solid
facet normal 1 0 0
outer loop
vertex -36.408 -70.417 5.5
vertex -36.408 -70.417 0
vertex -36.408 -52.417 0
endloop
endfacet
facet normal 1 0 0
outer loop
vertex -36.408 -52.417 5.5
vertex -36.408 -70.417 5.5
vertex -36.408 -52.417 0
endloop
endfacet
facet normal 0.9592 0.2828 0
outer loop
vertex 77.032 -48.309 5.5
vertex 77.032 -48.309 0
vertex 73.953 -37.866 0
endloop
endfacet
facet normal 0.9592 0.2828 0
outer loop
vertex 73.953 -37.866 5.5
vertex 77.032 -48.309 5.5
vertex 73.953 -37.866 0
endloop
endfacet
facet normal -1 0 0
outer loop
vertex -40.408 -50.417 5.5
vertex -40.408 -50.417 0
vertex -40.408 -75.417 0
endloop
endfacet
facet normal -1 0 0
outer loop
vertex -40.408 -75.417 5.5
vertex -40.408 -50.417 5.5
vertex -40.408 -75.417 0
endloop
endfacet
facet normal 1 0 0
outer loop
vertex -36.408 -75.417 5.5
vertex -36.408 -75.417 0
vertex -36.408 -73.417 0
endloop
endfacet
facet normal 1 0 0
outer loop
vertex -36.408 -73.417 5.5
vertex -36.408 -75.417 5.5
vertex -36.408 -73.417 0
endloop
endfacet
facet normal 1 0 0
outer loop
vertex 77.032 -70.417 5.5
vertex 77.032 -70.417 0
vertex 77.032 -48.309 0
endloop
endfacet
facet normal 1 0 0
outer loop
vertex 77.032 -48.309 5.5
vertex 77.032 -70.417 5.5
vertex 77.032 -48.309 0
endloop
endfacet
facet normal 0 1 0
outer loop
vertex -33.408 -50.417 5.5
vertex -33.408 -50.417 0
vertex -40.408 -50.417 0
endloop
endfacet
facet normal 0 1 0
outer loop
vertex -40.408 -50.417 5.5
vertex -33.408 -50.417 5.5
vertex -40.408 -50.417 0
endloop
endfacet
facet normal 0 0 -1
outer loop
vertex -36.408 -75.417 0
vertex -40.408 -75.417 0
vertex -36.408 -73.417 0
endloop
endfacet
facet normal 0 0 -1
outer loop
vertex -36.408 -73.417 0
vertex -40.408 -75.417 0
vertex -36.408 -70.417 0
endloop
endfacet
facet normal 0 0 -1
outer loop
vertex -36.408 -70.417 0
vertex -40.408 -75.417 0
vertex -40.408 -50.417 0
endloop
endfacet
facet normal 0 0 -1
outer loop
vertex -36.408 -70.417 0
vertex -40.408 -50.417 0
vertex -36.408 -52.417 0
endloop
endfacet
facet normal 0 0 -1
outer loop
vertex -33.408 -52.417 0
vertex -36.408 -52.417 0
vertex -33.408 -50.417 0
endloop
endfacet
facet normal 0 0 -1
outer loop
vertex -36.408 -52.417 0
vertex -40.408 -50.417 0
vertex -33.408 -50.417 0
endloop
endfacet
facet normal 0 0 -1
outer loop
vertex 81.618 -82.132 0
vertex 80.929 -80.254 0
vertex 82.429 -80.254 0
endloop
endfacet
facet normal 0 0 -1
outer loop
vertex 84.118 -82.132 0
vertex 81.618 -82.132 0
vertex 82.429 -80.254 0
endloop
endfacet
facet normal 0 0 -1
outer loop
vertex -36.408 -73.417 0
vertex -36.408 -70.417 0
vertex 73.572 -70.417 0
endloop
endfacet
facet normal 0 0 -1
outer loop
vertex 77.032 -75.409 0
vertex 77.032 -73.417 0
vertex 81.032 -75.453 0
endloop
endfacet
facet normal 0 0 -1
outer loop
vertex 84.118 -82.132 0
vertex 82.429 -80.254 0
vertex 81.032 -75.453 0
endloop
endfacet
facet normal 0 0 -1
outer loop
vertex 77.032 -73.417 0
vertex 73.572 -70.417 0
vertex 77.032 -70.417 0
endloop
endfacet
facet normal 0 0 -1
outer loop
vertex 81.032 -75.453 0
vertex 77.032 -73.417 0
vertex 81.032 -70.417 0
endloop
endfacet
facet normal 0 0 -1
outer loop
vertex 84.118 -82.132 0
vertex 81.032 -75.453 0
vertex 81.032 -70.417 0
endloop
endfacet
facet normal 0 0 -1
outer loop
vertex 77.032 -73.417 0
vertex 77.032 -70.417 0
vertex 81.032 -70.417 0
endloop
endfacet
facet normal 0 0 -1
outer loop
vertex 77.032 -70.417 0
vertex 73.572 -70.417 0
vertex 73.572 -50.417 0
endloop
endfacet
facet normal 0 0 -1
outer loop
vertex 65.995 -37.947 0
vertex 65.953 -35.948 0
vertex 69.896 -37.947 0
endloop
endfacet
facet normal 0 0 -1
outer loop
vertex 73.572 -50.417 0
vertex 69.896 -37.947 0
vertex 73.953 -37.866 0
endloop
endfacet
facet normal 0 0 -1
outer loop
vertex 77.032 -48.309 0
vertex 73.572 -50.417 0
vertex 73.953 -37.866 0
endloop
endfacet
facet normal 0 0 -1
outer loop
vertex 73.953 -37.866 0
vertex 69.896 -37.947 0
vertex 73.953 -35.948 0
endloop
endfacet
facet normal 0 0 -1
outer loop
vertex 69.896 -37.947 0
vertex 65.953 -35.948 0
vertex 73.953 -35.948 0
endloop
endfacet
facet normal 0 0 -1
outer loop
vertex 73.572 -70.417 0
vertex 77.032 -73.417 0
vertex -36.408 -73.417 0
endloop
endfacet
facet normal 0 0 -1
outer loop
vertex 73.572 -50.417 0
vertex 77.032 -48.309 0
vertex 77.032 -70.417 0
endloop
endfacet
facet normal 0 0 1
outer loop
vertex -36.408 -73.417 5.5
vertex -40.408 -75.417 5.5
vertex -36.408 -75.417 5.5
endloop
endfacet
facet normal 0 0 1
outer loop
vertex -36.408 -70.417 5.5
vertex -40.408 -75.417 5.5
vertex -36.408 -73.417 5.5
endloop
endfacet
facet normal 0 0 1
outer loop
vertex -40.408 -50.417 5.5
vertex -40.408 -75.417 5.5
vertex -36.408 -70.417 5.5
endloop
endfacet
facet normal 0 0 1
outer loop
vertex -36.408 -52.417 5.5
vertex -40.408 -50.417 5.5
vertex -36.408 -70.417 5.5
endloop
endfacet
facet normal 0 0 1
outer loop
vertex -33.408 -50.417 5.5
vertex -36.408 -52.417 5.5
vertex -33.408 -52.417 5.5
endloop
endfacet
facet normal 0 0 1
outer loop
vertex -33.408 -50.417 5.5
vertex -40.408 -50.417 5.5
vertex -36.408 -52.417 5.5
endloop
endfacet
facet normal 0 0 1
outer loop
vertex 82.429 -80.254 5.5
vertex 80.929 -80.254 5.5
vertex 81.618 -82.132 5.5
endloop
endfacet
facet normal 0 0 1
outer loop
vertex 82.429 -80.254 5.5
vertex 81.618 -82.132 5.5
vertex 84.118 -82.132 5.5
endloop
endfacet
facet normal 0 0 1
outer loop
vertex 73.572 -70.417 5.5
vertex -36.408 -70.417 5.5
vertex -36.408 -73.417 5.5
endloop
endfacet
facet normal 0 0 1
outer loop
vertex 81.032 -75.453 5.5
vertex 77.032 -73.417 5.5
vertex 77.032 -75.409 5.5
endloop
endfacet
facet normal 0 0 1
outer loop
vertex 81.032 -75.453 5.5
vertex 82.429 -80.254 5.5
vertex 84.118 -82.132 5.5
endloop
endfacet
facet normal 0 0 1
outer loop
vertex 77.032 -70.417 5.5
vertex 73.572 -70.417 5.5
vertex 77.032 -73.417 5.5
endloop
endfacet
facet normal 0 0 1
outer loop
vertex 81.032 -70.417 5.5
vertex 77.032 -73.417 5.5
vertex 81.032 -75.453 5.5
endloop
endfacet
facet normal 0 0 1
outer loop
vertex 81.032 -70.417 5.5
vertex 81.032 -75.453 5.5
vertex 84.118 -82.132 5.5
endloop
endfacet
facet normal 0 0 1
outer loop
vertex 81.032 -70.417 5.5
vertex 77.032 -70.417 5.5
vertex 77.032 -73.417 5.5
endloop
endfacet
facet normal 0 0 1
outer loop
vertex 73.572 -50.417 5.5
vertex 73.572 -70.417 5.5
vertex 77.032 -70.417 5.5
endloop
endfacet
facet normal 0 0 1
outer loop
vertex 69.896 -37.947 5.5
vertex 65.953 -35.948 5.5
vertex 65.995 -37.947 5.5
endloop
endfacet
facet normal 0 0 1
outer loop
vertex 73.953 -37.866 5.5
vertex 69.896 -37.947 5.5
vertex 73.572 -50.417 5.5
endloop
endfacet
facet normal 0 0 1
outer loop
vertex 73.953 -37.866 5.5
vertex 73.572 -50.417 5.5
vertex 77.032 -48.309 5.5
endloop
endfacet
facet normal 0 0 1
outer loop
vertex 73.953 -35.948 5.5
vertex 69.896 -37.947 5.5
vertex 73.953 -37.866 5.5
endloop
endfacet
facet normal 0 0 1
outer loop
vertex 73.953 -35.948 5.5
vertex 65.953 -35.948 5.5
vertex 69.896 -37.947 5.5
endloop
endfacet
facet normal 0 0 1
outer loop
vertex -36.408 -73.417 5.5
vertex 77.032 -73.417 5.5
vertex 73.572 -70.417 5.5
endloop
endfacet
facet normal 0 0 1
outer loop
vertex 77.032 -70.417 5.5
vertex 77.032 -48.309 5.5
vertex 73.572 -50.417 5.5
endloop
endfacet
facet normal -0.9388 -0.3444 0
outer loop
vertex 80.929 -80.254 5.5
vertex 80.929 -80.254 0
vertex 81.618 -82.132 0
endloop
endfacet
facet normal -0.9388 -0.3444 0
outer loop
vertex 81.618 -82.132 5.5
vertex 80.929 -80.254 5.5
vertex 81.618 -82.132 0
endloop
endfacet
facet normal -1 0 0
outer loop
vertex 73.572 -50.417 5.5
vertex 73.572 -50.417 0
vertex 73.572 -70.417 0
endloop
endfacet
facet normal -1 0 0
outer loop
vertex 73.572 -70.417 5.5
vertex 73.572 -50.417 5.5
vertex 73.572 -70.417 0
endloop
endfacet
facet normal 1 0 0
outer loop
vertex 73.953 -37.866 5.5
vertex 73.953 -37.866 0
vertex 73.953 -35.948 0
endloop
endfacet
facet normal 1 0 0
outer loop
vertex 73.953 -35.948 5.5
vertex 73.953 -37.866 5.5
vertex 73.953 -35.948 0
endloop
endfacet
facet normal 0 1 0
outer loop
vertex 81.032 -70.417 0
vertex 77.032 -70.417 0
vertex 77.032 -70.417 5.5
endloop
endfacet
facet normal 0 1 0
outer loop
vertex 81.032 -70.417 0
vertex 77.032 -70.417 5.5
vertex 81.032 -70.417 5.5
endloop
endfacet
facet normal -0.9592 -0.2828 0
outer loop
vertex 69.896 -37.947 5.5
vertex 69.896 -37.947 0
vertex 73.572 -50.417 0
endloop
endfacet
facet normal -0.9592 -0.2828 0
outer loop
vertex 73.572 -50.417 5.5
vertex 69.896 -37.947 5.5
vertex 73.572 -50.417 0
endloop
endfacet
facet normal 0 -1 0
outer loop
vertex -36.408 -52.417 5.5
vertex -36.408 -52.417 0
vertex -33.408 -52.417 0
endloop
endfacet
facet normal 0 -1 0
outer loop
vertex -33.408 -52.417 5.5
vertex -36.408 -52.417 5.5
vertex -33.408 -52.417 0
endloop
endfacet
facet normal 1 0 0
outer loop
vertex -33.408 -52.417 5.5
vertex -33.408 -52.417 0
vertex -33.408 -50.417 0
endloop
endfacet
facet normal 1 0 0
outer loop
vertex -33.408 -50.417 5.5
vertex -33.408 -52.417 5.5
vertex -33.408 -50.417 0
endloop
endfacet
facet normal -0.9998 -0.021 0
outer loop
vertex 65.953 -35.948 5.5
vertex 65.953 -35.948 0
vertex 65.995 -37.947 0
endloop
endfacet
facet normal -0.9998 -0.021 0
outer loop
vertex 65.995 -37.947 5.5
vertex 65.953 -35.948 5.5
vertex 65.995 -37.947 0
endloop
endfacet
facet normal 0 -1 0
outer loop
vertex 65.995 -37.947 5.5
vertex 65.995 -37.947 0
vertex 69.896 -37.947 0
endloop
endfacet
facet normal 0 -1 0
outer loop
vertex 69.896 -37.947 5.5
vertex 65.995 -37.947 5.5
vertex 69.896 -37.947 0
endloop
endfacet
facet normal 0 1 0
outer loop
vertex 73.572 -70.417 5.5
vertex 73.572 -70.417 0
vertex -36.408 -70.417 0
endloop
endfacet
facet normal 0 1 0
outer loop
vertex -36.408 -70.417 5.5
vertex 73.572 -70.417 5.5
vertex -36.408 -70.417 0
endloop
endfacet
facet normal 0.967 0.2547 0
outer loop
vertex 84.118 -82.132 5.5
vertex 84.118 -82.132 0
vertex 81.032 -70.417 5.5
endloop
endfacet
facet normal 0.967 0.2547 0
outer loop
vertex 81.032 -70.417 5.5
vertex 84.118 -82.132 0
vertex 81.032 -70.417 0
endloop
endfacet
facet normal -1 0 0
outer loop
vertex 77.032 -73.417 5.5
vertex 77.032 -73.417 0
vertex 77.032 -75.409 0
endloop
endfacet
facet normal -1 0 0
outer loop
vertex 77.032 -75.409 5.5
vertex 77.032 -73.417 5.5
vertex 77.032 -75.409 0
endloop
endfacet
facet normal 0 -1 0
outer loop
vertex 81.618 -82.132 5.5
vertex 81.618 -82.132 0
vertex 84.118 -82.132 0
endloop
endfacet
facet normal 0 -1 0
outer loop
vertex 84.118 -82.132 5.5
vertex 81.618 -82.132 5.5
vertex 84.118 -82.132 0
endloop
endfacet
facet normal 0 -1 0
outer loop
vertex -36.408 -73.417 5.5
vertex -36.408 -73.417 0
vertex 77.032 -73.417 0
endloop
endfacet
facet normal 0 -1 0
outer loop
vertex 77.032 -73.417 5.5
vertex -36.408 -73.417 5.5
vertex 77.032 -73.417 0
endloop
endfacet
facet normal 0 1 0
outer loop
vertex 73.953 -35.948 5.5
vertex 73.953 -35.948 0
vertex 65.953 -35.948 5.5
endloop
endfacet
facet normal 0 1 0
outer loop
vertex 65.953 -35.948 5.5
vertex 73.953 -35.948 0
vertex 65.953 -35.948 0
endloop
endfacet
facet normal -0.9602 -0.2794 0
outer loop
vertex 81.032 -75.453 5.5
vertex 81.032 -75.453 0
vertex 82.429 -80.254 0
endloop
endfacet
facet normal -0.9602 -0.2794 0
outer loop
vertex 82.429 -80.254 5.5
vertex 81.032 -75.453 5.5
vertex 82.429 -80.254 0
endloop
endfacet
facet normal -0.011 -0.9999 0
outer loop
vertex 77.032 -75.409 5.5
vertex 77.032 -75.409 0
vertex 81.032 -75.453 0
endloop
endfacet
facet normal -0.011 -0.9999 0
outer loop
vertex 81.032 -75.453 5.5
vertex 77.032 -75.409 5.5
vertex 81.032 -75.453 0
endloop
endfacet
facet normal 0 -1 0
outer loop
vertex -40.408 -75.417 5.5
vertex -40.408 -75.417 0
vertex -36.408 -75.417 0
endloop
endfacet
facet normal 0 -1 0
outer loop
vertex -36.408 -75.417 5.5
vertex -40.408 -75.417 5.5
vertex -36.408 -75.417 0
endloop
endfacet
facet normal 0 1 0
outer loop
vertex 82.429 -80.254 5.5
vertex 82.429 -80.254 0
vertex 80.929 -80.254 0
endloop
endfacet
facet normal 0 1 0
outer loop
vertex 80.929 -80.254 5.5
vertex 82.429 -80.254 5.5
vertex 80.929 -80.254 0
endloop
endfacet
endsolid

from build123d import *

# Parameters (mm, degrees)
F0_W     = 3
F0_H     = 2
F0_W_2   = 4
F0_H_2   = 2.991964
F1_DEPTH = 5.5


with BuildPart() as f1:
    # F0 (on Top) → F1 (new body)
    with BuildSketch(Plane.XY):
        Polygon((-36.408239, -50.416655), (-40.408239, -50.416655), (-40.408239, -73.416655), (-36.408239, -73.416655), (-36.408239, -70.416655), (-36.408239, -52.416655), align=None)
        with Locations((-34.908239, -51.416655)):
            Rectangle(F0_W, F0_H)
        with Locations((-38.408239, -74.416655)):
            Rectangle(F0_W_2, F0_H)
        Polygon((-36.408239, -70.416655), (-36.408239, -73.416655), (77.031761, -73.416655), (77.031761, -73.408619), (77.031761, -70.416655), (73.57222, -70.416655), align=None)
        Polygon((77.031761, -73.408619), (77.031761, -73.416655), (77.031761, -75.408619), (81.031761, -75.453453), (81.031761, -73.408619), align=None)
        Polygon((73.57222, -50.416655), (73.57222, -70.416655), (77.031761, -70.416655), (77.031761, -48.309352), (73.952891, -37.865963), (73.952891, -35.947701), (65.952891, -35.947701), (65.994848, -37.94726), (69.896053, -37.94726), align=None)
        with Locations((79.031761, -71.912637)):
            Rectangle(F0_W_2, F0_H_2)
        Polygon((81.031761, -70.416655), (81.031761, -73.408619), (81.031761, -75.453453), (82.42857, -80.254382), (80.92857, -80.254382), (81.617752, -82.131888), (84.117752, -82.131888), align=None)
    extrude(amount=F1_DEPTH)


solid = f1.part
